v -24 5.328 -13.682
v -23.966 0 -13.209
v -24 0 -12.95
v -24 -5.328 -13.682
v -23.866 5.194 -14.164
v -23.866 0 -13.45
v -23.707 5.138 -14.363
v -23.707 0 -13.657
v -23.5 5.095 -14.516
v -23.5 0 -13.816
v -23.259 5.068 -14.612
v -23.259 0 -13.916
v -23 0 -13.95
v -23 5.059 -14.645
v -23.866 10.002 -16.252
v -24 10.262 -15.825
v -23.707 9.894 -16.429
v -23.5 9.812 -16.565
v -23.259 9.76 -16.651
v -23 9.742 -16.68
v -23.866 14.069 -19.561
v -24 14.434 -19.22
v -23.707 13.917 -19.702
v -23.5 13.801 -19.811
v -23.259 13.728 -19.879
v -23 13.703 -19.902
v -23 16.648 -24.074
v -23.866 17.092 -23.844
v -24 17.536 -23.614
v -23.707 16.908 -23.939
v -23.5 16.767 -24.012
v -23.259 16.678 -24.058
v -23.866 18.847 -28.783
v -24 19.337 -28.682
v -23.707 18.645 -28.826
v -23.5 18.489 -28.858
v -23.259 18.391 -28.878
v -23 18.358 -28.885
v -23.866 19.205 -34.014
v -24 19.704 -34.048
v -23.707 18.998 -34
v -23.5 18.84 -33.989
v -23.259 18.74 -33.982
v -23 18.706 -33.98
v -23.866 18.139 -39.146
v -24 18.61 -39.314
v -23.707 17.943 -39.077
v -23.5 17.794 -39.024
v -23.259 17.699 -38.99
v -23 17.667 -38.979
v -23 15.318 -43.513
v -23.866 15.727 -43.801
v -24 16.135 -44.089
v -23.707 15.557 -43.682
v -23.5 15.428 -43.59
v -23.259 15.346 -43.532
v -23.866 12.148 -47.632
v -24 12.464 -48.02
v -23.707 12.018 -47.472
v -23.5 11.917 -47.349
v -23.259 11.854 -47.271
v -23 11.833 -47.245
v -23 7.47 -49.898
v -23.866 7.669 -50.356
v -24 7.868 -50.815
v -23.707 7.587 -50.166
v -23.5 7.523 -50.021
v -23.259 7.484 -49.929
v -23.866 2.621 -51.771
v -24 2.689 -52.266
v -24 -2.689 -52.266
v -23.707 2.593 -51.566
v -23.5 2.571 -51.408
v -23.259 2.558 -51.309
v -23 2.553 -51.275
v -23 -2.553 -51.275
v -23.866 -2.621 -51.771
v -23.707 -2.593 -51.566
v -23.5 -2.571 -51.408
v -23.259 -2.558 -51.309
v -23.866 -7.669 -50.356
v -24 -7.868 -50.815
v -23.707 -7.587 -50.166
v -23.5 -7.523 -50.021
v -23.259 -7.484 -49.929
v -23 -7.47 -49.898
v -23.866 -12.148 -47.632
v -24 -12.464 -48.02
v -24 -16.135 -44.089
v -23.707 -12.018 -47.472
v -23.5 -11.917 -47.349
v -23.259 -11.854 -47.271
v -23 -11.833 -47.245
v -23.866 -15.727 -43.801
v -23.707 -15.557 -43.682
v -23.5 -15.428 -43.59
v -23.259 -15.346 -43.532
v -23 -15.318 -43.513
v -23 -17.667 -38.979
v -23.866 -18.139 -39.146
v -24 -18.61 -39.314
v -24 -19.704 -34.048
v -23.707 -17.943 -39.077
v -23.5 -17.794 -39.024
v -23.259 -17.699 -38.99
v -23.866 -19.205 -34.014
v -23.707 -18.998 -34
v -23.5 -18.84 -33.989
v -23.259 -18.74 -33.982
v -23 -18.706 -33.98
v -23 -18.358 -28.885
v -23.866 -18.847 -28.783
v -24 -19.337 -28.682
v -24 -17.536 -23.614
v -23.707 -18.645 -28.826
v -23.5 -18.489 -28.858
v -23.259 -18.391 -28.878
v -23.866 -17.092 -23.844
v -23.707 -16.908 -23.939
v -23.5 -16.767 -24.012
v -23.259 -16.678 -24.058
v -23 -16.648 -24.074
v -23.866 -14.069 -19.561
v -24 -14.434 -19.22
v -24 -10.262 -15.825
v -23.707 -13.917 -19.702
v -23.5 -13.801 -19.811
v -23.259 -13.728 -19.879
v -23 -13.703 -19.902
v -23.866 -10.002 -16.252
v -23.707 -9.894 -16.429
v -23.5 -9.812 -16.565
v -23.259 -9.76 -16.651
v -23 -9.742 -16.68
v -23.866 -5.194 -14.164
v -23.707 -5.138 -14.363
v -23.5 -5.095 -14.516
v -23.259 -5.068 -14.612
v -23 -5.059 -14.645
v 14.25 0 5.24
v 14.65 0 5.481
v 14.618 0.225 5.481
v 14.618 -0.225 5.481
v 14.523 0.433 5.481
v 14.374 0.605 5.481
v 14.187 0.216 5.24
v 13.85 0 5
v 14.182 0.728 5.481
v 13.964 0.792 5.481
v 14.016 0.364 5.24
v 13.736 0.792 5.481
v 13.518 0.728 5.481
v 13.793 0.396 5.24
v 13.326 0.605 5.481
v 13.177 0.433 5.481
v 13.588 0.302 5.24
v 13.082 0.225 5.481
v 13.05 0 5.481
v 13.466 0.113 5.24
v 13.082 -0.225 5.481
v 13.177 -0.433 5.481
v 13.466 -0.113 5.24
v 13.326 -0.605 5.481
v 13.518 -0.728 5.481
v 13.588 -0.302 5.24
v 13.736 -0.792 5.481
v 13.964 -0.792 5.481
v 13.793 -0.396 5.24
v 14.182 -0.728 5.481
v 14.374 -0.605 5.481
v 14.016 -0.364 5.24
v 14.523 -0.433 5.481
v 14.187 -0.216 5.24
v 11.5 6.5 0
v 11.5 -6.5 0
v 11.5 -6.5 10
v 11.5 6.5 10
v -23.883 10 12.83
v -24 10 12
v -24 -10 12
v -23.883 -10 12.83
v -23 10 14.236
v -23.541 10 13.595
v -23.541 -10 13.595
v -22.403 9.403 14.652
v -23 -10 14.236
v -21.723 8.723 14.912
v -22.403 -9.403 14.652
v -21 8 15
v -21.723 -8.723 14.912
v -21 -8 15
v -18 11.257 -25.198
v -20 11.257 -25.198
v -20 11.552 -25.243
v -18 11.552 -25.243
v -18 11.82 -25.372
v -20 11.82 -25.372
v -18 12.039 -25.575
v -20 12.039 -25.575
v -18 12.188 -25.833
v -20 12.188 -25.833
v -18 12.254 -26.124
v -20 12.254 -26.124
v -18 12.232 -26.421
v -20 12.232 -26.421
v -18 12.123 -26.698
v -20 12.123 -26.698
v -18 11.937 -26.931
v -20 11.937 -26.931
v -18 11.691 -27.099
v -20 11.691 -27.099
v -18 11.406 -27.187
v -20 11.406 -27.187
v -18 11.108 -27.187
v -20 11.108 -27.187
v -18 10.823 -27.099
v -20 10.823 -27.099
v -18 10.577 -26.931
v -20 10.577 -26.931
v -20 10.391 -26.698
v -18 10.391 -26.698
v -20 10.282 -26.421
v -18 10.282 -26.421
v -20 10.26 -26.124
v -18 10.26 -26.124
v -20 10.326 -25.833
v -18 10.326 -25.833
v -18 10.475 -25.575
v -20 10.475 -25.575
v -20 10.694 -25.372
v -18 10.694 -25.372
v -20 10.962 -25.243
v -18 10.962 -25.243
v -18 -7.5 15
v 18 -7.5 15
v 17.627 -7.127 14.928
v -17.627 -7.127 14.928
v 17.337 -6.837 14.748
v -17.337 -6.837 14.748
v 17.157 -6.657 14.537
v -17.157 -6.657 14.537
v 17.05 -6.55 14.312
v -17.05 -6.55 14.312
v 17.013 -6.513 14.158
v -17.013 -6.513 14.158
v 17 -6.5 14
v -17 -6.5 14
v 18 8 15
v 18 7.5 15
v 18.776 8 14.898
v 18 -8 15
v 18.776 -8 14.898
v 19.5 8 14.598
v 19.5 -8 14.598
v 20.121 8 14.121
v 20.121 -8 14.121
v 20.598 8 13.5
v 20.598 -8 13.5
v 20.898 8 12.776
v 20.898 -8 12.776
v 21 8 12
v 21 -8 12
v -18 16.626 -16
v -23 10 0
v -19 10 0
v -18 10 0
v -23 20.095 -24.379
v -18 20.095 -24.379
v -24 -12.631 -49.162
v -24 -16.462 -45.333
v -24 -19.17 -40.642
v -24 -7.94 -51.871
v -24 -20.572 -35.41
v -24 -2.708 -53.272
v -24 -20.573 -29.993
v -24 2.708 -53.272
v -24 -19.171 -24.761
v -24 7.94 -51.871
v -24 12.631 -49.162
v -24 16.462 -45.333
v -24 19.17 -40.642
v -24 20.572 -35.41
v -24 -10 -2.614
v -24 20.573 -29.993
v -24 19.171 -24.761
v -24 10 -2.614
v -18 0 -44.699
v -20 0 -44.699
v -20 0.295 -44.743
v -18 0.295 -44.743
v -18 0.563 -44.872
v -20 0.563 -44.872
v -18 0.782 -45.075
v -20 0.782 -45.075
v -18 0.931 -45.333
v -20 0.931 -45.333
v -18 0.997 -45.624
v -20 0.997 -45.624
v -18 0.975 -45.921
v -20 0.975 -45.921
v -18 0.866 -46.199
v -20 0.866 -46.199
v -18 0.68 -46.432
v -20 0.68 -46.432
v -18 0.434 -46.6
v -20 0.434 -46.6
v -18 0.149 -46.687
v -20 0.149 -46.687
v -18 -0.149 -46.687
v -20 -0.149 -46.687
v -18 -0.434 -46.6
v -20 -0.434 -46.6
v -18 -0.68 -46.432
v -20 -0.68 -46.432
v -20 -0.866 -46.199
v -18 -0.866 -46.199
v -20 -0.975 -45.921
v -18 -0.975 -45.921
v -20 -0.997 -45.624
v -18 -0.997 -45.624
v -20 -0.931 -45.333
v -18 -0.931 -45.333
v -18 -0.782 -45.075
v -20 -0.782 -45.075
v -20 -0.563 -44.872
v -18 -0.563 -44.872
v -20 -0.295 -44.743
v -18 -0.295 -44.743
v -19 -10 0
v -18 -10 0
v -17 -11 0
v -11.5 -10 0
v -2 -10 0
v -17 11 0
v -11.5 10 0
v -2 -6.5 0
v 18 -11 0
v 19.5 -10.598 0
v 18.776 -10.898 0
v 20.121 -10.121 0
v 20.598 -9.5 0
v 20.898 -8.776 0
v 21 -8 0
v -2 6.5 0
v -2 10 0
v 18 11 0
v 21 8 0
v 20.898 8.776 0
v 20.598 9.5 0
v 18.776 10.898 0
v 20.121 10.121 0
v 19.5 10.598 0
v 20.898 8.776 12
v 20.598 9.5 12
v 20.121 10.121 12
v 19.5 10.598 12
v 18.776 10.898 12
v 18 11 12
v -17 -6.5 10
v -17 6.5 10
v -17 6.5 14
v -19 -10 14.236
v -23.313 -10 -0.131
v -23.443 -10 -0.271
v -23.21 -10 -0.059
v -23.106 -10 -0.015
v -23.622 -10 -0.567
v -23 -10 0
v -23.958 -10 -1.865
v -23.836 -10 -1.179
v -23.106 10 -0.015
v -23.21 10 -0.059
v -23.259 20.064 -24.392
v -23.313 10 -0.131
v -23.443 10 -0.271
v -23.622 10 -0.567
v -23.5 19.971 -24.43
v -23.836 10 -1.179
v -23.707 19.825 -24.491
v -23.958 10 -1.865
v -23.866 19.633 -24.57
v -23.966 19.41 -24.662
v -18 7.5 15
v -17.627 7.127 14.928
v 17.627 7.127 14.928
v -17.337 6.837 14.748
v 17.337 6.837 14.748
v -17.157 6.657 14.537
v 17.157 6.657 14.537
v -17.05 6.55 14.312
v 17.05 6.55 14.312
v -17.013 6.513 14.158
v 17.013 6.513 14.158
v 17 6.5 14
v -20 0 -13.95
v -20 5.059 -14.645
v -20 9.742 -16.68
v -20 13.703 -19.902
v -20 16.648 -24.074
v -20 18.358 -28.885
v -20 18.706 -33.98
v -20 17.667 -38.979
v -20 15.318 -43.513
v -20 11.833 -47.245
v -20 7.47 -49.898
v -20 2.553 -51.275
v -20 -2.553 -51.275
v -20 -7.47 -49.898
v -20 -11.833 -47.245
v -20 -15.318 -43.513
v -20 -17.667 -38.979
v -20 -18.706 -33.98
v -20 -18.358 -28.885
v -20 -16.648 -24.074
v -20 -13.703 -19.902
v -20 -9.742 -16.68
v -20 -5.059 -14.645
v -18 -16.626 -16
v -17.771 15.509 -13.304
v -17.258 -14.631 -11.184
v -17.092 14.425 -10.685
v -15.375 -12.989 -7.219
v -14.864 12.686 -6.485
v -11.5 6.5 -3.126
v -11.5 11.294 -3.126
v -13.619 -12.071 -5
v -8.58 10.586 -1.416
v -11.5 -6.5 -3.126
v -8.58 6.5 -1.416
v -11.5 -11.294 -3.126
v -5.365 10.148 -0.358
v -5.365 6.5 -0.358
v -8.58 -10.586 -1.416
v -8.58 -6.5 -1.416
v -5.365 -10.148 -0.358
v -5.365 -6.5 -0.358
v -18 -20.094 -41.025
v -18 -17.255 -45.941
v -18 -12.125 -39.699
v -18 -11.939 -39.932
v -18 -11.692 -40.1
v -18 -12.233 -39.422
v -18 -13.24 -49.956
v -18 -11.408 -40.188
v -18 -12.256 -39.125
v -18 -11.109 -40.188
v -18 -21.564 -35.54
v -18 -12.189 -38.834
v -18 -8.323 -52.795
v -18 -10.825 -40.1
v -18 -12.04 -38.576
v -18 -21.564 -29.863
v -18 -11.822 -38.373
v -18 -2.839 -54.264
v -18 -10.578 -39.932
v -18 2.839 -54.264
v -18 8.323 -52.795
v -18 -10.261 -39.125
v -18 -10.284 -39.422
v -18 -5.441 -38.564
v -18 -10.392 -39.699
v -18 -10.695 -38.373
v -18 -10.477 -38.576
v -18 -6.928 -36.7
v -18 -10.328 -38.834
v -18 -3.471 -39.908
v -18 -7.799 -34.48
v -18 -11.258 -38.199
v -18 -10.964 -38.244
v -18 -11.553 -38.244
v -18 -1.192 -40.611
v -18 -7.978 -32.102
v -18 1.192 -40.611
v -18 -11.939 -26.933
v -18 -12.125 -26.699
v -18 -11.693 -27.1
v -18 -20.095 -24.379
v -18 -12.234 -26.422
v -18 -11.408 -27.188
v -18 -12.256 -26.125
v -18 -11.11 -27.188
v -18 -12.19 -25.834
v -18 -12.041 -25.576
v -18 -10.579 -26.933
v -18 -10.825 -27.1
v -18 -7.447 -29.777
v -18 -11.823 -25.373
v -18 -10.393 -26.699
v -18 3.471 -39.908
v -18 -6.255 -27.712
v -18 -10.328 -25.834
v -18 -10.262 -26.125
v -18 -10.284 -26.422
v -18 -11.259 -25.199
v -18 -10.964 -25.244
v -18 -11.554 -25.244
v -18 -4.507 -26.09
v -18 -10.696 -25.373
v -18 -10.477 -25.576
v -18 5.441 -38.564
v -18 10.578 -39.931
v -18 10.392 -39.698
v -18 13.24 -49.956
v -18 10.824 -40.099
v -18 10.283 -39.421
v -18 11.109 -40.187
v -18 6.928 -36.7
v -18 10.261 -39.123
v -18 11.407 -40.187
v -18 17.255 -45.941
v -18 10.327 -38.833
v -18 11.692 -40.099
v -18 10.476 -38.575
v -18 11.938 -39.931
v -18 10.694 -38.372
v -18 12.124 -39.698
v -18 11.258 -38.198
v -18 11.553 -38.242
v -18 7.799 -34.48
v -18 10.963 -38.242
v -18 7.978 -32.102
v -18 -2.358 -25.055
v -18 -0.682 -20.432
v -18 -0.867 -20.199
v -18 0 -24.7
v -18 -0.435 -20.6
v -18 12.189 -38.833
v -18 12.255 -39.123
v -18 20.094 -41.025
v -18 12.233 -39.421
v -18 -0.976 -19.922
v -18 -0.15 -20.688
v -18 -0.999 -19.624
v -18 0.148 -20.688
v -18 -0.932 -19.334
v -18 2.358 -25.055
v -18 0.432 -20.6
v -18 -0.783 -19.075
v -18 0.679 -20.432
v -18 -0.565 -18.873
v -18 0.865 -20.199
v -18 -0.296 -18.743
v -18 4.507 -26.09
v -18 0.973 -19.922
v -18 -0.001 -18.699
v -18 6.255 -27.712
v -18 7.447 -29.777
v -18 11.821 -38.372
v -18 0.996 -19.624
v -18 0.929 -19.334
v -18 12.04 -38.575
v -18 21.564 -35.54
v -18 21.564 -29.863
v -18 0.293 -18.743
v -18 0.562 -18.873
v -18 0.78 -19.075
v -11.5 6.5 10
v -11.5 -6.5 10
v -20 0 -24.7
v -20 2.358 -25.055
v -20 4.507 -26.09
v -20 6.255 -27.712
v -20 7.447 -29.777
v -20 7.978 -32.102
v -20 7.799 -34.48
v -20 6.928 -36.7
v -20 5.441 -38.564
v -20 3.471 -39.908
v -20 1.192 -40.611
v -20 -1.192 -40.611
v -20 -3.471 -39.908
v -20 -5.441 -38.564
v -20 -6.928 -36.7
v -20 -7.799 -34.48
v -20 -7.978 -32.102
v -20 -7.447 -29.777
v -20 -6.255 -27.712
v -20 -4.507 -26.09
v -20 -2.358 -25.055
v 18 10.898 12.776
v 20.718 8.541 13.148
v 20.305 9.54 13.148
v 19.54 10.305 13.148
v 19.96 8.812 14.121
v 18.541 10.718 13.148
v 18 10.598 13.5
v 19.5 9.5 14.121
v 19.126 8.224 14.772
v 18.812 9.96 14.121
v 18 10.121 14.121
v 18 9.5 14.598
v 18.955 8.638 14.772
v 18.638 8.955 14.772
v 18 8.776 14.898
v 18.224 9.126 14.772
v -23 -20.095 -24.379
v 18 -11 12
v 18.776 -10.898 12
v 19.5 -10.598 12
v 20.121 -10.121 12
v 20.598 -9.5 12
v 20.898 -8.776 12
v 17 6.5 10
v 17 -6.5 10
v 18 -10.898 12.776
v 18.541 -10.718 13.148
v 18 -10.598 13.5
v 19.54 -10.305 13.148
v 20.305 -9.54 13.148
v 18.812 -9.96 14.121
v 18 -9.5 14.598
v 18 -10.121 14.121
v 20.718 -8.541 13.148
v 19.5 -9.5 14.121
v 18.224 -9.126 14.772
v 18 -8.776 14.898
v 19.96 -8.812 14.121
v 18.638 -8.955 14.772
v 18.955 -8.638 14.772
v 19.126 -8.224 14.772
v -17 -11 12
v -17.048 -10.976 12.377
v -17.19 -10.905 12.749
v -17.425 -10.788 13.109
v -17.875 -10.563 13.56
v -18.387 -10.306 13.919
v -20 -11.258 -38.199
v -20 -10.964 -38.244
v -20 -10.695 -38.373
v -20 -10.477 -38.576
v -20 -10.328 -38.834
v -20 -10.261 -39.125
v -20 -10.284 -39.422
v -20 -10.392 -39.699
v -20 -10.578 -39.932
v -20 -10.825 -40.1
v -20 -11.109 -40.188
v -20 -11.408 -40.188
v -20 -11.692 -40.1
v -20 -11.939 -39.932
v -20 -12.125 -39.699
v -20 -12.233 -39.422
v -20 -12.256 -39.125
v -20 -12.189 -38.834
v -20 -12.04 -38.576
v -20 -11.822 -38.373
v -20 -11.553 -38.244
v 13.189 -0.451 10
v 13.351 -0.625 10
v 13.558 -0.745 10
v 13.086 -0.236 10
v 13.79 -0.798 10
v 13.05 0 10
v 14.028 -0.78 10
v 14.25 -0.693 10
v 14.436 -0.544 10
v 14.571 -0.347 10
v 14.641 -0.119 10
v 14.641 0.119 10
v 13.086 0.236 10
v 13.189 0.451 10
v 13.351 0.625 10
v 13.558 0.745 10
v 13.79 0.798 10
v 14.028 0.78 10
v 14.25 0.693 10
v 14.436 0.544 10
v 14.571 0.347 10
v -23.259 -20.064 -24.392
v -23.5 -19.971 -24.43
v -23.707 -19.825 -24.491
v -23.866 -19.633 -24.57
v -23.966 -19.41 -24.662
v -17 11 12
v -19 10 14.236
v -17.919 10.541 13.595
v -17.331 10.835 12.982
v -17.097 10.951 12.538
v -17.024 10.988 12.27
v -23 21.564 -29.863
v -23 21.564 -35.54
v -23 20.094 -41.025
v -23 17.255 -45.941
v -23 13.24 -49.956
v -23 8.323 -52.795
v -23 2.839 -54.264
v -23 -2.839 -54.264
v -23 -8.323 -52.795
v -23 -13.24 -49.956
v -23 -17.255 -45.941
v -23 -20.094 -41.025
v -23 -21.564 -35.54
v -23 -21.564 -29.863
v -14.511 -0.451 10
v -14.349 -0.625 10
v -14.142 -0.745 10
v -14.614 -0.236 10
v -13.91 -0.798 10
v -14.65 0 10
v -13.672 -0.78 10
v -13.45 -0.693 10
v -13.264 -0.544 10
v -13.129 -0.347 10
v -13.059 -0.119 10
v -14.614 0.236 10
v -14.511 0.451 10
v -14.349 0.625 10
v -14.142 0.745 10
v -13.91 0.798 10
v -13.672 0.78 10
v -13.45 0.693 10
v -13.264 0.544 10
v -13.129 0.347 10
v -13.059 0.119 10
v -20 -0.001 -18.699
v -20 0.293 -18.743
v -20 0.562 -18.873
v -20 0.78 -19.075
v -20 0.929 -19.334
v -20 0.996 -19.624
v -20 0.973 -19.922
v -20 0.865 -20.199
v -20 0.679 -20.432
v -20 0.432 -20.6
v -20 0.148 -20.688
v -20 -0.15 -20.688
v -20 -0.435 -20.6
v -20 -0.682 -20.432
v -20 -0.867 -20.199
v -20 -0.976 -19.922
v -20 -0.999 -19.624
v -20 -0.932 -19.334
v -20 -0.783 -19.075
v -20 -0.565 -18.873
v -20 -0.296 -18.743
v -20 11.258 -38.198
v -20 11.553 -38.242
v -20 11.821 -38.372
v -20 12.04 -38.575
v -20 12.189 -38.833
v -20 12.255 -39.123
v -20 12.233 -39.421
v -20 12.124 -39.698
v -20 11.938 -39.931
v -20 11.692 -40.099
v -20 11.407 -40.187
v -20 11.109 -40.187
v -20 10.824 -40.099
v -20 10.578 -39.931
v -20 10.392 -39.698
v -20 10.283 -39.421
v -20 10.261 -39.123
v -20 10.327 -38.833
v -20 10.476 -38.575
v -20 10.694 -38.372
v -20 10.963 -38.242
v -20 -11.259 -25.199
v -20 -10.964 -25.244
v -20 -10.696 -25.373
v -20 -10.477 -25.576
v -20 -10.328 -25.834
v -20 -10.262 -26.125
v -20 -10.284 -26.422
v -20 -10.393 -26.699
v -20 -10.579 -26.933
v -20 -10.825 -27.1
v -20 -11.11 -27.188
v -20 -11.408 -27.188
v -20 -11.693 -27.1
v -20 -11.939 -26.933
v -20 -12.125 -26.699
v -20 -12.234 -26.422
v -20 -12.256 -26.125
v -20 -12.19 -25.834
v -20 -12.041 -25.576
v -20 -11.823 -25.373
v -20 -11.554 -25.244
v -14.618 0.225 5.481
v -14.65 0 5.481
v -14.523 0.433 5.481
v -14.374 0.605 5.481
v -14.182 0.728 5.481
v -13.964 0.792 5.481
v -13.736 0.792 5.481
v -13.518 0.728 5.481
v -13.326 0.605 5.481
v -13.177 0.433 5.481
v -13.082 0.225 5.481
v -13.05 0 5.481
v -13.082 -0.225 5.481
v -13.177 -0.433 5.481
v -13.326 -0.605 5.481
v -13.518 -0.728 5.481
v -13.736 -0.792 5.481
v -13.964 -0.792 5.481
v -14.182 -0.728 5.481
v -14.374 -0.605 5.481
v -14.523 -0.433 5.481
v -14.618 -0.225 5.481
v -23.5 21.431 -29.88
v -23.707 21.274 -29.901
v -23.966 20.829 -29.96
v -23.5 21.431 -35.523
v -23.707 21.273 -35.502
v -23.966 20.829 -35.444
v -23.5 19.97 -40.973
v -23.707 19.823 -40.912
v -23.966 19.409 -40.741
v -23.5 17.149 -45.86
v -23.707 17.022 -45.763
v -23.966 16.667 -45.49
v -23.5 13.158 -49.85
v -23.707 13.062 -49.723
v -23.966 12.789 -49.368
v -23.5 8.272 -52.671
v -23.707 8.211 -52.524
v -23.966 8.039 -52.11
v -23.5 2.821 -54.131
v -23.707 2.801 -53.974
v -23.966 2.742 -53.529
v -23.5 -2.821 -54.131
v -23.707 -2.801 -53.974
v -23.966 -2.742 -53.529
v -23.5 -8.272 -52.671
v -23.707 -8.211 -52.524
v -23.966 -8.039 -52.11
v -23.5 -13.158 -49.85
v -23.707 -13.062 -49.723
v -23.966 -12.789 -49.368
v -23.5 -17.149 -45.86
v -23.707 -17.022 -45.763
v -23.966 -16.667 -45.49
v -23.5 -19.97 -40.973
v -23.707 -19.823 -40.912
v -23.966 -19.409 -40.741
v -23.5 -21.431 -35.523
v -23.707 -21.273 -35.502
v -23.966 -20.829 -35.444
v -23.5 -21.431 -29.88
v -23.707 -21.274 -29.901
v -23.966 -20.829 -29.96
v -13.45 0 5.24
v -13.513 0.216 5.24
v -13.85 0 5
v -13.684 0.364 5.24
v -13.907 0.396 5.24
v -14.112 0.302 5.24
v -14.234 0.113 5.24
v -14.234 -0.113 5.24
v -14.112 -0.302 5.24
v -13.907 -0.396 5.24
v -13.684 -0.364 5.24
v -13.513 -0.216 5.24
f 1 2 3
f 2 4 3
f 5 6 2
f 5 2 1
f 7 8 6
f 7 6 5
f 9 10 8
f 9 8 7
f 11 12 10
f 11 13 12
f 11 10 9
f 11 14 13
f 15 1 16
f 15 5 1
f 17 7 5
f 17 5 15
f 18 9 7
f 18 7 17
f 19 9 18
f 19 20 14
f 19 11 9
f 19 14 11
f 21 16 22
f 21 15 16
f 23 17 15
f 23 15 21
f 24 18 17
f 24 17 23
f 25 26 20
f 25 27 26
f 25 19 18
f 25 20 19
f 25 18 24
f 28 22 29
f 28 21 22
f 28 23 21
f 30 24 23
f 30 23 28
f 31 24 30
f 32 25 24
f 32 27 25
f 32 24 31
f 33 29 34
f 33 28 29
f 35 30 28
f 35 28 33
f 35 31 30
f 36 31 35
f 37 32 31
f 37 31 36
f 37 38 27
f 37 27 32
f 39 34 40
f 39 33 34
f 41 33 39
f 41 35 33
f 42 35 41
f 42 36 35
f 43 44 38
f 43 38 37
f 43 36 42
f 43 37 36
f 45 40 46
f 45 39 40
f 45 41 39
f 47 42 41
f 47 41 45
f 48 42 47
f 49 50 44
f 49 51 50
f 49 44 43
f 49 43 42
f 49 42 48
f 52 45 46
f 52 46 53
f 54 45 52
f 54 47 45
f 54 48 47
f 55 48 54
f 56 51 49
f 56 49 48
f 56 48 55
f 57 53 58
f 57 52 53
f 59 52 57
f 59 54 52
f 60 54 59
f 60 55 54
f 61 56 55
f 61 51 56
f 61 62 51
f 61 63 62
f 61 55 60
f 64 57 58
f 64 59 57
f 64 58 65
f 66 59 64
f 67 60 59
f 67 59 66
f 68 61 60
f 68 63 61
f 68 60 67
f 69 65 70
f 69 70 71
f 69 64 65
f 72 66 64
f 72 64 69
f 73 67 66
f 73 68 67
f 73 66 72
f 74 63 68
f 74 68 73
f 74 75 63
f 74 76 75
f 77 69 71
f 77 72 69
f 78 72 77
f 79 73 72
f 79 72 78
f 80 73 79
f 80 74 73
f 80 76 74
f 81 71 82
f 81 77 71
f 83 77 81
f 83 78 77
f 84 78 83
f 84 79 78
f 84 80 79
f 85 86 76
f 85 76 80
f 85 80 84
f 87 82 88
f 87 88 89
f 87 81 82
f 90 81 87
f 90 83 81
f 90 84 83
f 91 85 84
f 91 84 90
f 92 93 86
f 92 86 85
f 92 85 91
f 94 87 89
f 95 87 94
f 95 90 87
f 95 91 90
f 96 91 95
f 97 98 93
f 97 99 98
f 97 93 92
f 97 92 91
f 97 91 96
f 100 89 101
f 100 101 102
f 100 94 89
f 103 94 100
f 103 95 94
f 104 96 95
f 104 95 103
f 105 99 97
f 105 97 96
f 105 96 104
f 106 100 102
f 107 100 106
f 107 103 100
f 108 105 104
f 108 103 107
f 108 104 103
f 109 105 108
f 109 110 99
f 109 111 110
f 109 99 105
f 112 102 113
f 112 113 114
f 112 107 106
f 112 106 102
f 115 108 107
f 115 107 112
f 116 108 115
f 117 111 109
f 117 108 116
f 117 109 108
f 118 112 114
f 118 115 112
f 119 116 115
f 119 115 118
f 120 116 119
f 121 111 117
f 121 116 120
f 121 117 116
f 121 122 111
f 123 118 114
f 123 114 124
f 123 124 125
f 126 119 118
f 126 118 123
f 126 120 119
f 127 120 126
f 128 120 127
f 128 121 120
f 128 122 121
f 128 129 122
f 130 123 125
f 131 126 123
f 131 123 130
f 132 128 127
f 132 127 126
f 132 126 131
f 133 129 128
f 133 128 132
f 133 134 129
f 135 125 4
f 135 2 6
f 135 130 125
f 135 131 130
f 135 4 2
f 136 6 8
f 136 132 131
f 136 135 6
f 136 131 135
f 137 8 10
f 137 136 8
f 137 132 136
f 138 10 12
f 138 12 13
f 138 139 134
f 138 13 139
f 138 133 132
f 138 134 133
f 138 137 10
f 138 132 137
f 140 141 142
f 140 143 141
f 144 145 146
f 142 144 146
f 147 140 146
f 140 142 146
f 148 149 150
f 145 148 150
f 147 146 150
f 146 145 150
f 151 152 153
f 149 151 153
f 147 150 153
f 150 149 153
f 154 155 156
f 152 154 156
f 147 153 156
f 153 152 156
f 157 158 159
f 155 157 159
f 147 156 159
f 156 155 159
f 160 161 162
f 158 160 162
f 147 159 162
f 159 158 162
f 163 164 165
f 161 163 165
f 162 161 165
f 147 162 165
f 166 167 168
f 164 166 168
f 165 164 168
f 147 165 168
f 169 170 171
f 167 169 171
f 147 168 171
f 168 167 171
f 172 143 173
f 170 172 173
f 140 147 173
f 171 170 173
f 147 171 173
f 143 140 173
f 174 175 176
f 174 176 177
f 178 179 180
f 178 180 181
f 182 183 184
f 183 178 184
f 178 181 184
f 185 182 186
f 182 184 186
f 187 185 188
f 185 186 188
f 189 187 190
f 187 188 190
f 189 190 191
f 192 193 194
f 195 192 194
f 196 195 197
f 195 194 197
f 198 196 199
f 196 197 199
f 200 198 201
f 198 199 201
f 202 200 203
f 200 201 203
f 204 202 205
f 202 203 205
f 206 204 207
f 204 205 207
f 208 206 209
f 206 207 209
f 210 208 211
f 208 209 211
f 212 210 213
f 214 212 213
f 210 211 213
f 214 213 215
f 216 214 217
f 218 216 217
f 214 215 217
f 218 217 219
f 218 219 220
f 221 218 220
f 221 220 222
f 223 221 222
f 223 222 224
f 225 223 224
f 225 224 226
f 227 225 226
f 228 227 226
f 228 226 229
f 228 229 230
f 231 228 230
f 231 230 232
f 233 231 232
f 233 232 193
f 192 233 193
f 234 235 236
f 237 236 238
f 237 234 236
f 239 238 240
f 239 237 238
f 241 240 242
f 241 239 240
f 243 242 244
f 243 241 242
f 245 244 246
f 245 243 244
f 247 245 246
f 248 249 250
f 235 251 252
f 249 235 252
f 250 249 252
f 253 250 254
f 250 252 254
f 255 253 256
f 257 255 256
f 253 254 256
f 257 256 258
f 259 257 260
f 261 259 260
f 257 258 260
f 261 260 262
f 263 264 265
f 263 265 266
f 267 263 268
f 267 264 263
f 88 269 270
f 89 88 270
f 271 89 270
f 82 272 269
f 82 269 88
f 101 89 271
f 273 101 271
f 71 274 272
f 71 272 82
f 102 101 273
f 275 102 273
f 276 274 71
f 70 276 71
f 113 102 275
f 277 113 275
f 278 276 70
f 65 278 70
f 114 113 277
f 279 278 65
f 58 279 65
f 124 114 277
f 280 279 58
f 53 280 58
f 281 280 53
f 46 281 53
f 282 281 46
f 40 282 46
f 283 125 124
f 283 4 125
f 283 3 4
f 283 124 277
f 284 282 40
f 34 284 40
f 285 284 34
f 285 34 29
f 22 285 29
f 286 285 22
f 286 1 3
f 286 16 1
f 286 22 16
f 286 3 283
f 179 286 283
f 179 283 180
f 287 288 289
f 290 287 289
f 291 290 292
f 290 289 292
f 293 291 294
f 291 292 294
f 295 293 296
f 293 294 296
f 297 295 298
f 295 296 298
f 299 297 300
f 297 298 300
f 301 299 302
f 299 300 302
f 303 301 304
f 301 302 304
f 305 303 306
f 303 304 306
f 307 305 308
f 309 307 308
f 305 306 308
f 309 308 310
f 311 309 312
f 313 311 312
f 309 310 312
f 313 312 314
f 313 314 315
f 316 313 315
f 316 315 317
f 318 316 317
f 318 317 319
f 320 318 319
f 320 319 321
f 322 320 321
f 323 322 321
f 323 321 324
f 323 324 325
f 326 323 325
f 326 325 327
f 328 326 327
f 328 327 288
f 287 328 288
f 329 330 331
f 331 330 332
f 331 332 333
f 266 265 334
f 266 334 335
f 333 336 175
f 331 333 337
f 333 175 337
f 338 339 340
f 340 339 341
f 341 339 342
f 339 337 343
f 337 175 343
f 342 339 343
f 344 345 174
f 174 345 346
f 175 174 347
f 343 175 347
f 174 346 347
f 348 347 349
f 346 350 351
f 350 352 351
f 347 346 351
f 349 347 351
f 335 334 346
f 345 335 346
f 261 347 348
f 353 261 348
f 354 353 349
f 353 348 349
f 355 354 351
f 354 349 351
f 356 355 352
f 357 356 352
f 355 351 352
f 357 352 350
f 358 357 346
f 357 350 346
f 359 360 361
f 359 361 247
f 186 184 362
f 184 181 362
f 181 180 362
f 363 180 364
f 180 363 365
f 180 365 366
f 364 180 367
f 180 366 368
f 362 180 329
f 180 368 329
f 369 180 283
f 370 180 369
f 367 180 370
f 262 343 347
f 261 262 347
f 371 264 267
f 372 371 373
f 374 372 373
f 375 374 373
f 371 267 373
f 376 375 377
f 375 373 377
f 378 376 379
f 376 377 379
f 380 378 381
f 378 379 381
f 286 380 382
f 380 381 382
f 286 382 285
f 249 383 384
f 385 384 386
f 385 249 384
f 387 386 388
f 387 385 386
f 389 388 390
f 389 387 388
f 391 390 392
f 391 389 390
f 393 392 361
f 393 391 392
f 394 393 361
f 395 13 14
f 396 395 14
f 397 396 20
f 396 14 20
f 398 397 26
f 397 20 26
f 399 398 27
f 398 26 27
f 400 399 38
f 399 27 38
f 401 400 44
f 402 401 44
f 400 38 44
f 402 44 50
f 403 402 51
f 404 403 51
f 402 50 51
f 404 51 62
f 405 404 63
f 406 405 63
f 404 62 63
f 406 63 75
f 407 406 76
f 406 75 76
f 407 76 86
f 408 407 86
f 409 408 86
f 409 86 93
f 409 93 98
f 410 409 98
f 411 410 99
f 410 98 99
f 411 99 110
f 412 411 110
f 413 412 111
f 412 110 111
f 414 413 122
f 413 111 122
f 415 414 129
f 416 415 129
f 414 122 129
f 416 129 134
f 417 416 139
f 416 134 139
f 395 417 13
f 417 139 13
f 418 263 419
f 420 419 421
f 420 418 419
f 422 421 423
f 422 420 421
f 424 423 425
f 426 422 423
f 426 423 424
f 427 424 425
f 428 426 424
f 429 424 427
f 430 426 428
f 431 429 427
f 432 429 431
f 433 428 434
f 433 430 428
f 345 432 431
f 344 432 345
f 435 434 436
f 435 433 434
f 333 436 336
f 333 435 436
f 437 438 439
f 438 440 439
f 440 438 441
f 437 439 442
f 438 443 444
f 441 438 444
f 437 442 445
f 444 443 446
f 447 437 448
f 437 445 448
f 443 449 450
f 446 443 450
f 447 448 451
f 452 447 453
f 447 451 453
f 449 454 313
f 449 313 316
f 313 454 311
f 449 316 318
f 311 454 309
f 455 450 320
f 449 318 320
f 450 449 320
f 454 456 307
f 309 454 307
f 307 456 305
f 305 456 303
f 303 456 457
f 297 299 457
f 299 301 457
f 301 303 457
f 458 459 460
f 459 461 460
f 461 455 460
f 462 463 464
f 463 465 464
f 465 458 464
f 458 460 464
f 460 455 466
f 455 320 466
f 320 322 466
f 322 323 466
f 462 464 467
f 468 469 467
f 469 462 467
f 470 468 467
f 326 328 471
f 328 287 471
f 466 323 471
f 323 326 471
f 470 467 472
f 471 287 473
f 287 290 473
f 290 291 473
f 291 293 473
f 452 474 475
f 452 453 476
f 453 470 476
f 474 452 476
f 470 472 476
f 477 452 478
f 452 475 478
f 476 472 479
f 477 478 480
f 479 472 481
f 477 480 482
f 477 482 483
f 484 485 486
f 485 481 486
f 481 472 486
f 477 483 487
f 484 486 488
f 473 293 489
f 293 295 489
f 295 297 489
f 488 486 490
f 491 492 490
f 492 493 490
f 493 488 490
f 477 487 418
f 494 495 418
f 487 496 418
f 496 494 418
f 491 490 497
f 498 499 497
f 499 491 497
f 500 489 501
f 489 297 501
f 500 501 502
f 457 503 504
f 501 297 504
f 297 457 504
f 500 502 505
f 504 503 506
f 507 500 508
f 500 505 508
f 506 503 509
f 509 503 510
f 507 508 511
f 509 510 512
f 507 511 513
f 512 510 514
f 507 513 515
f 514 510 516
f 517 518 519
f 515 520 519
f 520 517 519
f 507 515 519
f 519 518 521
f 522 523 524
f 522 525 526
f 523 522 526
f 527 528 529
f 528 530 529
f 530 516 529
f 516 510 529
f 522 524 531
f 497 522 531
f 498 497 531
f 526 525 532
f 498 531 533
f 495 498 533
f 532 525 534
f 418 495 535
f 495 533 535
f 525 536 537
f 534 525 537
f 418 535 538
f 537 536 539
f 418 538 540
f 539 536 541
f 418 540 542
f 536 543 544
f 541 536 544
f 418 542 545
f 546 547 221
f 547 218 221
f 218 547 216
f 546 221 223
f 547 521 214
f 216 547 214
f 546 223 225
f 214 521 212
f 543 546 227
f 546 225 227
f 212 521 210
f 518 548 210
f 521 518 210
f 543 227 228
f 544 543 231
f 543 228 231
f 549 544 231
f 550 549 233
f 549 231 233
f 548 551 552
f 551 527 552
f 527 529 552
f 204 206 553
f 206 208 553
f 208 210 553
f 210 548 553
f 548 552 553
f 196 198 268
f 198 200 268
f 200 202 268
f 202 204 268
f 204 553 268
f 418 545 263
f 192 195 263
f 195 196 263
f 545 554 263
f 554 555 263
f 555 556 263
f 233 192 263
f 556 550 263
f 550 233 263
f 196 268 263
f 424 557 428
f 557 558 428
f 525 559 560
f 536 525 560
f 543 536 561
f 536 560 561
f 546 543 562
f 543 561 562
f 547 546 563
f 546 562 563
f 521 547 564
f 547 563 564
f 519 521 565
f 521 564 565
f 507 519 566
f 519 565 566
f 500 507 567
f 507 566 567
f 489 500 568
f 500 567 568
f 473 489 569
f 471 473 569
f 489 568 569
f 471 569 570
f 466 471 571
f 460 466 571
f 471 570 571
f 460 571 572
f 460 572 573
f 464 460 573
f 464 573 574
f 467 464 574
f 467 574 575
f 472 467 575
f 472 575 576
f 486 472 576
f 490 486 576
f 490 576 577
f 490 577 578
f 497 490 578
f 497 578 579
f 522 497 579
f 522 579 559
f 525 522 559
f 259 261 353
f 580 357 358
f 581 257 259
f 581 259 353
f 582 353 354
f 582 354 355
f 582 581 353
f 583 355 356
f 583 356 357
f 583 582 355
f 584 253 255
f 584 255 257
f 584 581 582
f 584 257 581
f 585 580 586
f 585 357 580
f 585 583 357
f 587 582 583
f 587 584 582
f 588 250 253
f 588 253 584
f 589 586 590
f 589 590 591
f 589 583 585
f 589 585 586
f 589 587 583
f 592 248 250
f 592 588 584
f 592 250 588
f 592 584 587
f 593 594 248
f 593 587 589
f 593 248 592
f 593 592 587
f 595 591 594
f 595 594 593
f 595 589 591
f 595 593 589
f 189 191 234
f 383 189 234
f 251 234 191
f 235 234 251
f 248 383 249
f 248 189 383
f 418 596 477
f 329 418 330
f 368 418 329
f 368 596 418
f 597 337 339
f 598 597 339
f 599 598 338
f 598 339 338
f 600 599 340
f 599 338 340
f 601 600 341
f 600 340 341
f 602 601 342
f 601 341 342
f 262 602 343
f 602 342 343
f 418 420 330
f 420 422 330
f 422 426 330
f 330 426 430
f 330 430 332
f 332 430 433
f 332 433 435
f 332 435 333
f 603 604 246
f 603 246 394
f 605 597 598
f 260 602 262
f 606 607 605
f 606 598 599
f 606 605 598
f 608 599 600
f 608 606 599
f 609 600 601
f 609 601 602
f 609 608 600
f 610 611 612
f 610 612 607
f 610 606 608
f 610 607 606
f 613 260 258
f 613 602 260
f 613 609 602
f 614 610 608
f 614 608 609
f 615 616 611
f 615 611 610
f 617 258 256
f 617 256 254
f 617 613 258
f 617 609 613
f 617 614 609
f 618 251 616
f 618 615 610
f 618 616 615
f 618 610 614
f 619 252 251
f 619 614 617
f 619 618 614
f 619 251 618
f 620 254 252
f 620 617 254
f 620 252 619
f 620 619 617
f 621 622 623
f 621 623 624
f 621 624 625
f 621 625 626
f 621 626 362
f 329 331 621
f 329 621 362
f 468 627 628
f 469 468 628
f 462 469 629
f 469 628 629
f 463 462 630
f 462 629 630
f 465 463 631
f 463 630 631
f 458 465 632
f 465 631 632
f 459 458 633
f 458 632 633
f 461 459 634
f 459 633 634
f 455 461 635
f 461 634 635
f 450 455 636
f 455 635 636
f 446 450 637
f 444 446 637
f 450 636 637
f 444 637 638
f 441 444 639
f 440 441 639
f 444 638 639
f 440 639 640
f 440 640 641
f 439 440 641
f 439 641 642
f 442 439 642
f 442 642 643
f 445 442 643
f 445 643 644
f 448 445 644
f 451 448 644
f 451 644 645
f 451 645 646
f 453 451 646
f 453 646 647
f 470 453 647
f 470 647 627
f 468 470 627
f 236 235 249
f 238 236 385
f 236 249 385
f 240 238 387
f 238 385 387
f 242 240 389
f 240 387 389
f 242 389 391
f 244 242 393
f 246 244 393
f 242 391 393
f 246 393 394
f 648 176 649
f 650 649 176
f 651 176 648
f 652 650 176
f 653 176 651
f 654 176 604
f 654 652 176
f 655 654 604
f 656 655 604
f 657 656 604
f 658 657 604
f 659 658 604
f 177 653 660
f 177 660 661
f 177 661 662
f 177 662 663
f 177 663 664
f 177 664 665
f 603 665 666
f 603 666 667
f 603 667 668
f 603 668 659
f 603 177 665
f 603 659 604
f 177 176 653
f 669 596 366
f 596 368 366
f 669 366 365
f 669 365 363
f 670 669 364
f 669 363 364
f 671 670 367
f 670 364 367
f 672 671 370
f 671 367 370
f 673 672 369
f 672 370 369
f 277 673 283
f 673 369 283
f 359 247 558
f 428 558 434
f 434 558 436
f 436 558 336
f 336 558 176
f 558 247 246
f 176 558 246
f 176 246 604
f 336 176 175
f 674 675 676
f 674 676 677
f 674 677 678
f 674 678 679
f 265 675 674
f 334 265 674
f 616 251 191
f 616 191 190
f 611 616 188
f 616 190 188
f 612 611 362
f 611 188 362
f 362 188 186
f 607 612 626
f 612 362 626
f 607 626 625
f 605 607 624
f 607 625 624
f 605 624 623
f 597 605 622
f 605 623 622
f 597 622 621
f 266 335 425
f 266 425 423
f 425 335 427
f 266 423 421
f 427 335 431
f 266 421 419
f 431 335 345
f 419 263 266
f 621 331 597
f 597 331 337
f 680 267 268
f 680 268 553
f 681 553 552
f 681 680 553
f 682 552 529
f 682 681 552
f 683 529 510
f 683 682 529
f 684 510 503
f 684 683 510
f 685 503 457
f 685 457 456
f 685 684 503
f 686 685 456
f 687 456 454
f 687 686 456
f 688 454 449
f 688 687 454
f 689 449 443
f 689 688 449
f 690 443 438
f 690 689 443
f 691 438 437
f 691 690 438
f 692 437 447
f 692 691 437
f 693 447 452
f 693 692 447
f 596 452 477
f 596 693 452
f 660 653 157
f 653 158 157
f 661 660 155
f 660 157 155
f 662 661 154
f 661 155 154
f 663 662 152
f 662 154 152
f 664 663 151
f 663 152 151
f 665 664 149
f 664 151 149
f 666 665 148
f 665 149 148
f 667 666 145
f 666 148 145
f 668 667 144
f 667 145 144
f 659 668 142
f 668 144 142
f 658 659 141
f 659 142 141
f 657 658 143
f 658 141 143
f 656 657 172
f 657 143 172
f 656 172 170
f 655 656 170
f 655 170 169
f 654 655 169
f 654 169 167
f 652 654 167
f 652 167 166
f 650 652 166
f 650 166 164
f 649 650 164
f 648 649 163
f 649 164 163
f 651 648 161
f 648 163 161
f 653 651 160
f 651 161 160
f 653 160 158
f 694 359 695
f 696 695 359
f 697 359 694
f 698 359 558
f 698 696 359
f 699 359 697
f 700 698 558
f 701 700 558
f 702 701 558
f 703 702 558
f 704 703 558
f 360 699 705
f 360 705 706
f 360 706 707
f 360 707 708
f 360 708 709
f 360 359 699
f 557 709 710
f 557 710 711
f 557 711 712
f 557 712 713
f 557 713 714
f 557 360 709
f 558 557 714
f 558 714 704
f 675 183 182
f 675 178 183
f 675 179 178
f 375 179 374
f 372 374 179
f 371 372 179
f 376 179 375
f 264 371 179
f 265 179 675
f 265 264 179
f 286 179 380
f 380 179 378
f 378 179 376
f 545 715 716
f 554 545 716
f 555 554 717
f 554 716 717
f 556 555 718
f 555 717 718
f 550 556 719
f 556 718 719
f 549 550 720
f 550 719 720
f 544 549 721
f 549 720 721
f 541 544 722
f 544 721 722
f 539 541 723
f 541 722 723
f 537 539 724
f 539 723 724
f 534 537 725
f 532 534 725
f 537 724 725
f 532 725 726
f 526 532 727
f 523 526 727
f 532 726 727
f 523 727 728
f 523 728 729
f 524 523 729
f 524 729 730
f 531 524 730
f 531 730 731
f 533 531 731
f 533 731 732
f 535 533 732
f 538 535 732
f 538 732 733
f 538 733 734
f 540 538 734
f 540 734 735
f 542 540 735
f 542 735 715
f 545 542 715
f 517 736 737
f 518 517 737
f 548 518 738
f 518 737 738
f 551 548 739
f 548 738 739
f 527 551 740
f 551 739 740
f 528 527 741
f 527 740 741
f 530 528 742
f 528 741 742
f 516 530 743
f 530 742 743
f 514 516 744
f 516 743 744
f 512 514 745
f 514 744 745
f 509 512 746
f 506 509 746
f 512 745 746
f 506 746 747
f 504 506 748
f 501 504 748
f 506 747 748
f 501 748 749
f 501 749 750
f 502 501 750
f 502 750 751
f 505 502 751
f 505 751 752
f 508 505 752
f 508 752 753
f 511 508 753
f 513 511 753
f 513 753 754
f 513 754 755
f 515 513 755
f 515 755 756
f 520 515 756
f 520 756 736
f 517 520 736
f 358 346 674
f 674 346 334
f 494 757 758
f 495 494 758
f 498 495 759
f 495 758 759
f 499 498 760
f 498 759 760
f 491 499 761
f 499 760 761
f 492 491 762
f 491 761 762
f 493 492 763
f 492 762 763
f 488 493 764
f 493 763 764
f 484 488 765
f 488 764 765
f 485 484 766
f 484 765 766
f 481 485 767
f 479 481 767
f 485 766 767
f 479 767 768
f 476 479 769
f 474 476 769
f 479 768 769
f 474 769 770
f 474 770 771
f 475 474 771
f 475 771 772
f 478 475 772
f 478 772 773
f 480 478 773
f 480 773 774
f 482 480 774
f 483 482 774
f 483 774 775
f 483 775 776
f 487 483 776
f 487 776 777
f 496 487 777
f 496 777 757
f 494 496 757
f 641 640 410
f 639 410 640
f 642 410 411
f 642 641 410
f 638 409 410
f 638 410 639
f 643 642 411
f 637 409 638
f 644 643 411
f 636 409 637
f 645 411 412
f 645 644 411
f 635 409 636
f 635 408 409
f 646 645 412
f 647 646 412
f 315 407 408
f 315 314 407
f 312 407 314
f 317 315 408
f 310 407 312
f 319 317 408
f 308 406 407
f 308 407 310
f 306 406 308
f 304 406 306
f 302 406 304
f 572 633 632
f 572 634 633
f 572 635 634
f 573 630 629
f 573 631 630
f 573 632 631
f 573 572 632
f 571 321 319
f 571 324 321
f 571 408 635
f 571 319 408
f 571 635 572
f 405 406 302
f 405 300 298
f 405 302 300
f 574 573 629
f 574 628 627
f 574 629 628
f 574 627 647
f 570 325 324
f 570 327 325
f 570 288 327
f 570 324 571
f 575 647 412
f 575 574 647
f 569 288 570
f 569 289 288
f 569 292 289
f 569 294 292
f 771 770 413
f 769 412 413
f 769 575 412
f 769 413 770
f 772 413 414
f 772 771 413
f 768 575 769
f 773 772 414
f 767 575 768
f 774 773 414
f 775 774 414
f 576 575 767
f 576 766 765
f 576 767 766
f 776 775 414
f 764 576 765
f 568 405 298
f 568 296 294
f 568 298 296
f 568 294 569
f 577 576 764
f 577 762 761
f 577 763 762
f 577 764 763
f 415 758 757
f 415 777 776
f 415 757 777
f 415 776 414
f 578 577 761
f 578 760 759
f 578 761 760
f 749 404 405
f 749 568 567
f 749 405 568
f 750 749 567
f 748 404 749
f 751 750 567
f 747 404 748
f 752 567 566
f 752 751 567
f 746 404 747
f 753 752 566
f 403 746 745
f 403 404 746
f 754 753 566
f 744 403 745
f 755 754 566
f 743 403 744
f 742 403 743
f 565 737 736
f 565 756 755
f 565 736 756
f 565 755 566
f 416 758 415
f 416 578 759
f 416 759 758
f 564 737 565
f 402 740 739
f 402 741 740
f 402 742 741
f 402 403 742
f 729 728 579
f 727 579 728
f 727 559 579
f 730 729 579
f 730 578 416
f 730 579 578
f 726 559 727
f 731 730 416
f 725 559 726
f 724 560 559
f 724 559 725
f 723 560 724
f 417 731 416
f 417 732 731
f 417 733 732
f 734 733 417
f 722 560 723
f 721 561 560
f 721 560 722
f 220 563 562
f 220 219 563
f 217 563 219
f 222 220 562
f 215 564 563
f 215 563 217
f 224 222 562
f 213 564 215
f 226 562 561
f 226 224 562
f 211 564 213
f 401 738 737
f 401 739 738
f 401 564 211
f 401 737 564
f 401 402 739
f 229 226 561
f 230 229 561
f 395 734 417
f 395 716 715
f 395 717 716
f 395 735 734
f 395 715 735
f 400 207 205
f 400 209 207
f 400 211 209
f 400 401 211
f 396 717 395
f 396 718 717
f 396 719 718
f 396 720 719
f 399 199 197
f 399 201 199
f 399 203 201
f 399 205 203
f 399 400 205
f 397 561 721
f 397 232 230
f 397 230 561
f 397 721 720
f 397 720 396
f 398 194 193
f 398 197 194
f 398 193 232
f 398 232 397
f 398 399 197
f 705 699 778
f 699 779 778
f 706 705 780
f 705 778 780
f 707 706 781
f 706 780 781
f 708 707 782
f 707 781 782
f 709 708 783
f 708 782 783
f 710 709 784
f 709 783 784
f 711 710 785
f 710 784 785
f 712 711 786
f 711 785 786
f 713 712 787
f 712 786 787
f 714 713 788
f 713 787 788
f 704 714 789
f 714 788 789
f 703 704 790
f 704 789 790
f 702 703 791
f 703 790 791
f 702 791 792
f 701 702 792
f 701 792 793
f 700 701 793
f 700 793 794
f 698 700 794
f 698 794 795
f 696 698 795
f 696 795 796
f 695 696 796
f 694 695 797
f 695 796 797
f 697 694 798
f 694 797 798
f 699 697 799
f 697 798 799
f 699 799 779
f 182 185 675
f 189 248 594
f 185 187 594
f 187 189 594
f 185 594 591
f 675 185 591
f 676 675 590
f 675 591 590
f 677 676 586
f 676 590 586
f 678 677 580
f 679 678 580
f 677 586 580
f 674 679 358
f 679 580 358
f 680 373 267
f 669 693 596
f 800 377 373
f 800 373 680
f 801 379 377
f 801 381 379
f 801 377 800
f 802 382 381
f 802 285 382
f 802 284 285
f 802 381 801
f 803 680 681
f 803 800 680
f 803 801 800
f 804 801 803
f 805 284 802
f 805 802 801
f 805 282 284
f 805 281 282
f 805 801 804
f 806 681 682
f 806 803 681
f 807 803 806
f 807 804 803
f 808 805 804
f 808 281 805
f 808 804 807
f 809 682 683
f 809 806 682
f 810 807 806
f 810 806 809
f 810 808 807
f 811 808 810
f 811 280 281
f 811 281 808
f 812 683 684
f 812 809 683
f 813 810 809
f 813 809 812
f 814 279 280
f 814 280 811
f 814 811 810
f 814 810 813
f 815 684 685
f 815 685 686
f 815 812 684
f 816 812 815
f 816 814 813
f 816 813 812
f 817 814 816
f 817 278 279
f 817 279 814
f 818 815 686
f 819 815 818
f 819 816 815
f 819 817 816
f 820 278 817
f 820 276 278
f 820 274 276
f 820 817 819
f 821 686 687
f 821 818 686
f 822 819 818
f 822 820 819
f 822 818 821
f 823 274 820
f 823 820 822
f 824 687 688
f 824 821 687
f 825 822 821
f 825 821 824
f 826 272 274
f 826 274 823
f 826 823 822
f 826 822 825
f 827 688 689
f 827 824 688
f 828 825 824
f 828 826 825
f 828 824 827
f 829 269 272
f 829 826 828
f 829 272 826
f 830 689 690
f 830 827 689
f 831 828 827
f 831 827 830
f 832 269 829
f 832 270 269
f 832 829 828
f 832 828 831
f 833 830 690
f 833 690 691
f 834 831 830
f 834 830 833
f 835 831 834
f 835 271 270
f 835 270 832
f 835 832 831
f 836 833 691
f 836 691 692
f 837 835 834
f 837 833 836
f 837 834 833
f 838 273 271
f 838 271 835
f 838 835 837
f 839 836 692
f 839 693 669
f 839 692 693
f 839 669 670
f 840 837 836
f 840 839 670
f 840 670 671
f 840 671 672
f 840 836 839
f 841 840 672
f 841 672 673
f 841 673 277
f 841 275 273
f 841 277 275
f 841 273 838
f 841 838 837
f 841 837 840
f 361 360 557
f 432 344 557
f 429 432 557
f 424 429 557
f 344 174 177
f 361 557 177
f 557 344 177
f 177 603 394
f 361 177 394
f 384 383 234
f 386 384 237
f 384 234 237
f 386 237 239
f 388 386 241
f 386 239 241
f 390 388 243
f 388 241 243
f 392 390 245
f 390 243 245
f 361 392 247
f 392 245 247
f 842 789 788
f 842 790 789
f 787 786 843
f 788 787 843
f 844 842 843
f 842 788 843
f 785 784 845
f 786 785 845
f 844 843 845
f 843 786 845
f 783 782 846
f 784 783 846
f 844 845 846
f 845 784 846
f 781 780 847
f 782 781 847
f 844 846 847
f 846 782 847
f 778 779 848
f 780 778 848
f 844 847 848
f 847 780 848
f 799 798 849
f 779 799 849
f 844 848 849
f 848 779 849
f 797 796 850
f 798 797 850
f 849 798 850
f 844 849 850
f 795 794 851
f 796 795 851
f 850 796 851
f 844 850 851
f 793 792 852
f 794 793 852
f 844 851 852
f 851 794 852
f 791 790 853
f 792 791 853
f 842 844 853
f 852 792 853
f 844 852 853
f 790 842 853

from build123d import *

# Parameters (mm, degrees)
SKETCH_1_W              = 23
SKETCH_1_H              = 13
EXTRUDE_1_DEPTH         = 10
EXTRUDE_START           = 10
SKETCH_1_5_W            = 4
SKETCH_1_5_H            = 22
SKETCH_1_5_W_2          = 5
SKETCH_1_5_H_2          = 20
EXTRUDE_2_DEPTH         = 5
SKETCH_9_R              = 21.75
SKETCH_9_R_2            = 18.75
SKETCH_9_R_3            = 8
EXTRUDE_4_DEPTH         = 6
SKETCH_9_5_R            = 18.75
CUT_EXTRUDE_4_DEPTH     = 4
FILLET_6_R              = 1
SKETCH_10_R             = 1
CUT_EXTRUDE_5_DEPTH     = 4
FILLET_3_R              = 1
HOLE_WIZARD_M1_41_D     = 1.6
HOLE_WIZARD_M1_41_DEPTH = 4.519311505
HOLE_WIZARD_M1_41_TIP   = 0.480688495
FILLET_7_R              = 3
FILLET_8_R              = 16


with BuildPart() as part:
    # Эскиз1 → Бобышка-Вытянуть1 (new body)
    with BuildSketch(Plane.XY):
        Polygon((-17, -11), (21, -11), (21, 11), (-17, 11), (-19, 10), (-24, 10), (-24, -10), (-19, -10), align=None)
        Rectangle(SKETCH_1_W, SKETCH_1_H, mode=Mode.SUBTRACT)
    extrude(amount=EXTRUDE_1_DEPTH)

    # Эскиз1<5> → Бобышка-Вытянуть2 (add)
    with BuildSketch(Plane.XY.offset(EXTRUDE_START)):
        Polygon((-11.5, 6.5), (11.5, 6.5), (17, 6.5), (17, 11), (-17, 11), (-17, 6.5), align=None)
        with Locations((19, 0)):
            Rectangle(SKETCH_1_5_W, SKETCH_1_5_H)
        Polygon((17, -6.5), (11.5, -6.5), (-11.5, -6.5), (-17, -6.5), (-17, -11), (17, -11), align=None)
        Polygon((-19, -10), (-19, 10), (-17, 11), (-17, -11), align=None)
        with Locations((-21.5, 0)):
            Rectangle(SKETCH_1_5_W_2, SKETCH_1_5_H_2)
    extrude(amount=EXTRUDE_2_DEPTH)

    # Эскиз9 → Бобышка-Вытянуть4 (add)
    # profile 1 of 3: a face of its own
    with BuildSketch(Plane.ZY.offset(24)):
        with Locations((-32.7, 0)):
            Circle(SKETCH_9_R)
        with Locations((-32.7, 0)):
            Circle(SKETCH_9_R_2, mode=Mode.SUBTRACT)
    # profile 2 of 3: a face of its own
    with BuildSketch(Plane.ZY.offset(24)):
        with BuildLine():
            ThreePointArc((-10.95, 0), (-14.616118395, -12.08452424), (-24.378572515, -20.095182124))
            Line((-24.378572515, -20.095182124), (0, -10))
            Line((0, -10), (0, 10))
            Line((0, 10), (-24.378572515, 20.095182124))
            ThreePointArc((-24.378572515, 20.095182124), (-14.616118395, 12.08452424), (-10.95, 0))
        make_face()
    # profile 3 of 3: a face of its own
    with BuildSketch(Plane.ZY.offset(24)):
        with Locations((-32.7, 0)):
            Circle(SKETCH_9_R_2)
        with Locations((-32.7, 0)):
            Circle(SKETCH_9_R_3, mode=Mode.SUBTRACT)
    extrude(amount=-EXTRUDE_4_DEPTH)

    # Эскиз9<5> → Вырез-Вытянуть4 (cut)
    with BuildSketch(Plane.ZY.offset(24)):
        with Locations((-32.7, 0)):
            Circle(SKETCH_9_5_R)
    extrude(amount=-CUT_EXTRUDE_4_DEPTH, mode=Mode.SUBTRACT)

    # Скругление6
    fillet_6_edges = [part.edges().sort_by_distance(p)[0] for p in [
        (-24, 0, -51.45),
        (-24, 0, -54.45),
        (-24, -15.047591062, -12.189286258),
        (-24, 15.047591062, -12.189286258),
    ]]
    fillet(fillet_6_edges, radius=FILLET_6_R)

    # Эскиз10 → Вырез-Вытянуть5 (cut)
    with BuildSketch(Plane.ZY.offset(20)):
        with Locations((-45.698540936, 0)):
            Circle(SKETCH_10_R)
        with Locations((-39.198031114, 11.257782204)):
            Circle(SKETCH_10_R)
        with Locations((-26.198250825, 11.257066663)):
            Circle(SKETCH_10_R)
        with Locations((-19.698980357, -0.001431082)):
            Circle(SKETCH_10_R)
        with Locations((-26.199490179, -11.259213286)):
            Circle(SKETCH_10_R)
        with Locations((-39.199270468, -11.258497745)):
            Circle(SKETCH_10_R)
    extrude(amount=-CUT_EXTRUDE_5_DEPTH, mode=Mode.SUBTRACT)

    # Скругление3
    fillet_3_edges = [part.edges().sort_by_distance(p)[0] for p in [
        (0, 6.5, 15),
        (17, 0, 15),
        (-17, 0, 15),
        (0, -6.5, 15),
    ]]
    fillet(fillet_3_edges, radius=FILLET_3_R)

    # Отверстие с зазором M1.41
    with Locations(Plane.XY.offset(10)):
        with Locations((13.85, 0), (-13.85, 0)):
            Hole(HOLE_WIZARD_M1_41_D / 2, depth=HOLE_WIZARD_M1_41_DEPTH)
            with Locations((0, 0, -(HOLE_WIZARD_M1_41_DEPTH + HOLE_WIZARD_M1_41_TIP / 2))):  # 118° drill point
                Cone(0, HOLE_WIZARD_M1_41_D / 2, HOLE_WIZARD_M1_41_TIP, mode=Mode.SUBTRACT)

    # Скругление7
    # the kernel refuses this fillet: 3 mm, written as the material it takes off along each edge
    with BuildSketch(Plane(origin=(18, -8, 12), x_dir=(0, -1, 0), z_dir=(0, 0, 1))) as fillet_7_piece_1_section:
        Polygon((0, 0), (FILLET_7_R, 0), (FILLET_7_R, FILLET_7_R), (0, FILLET_7_R), align=None)
    fillet_7_piece_1 = extrude(amount=FILLET_7_R, mode=Mode.PRIVATE)
    fillet_7_piece_1 = fillet_7_piece_1 - Plane(origin=(18, -8, 12), x_dir=(-0.7071067811865475, 0.7071067811865475, 0), z_dir=(0, 0, 1)) * Sphere(FILLET_7_R, mode=Mode.PRIVATE)
    add(fillet_7_piece_1, mode=Mode.SUBTRACT)
    with BuildSketch(Plane(origin=(18, 8, 12), x_dir=(1, 0, 0), z_dir=(0, 0, 1))) as fillet_7_piece_2_section:
        Polygon((0, 0), (FILLET_7_R, 0), (FILLET_7_R, FILLET_7_R), (0, FILLET_7_R), align=None)
    fillet_7_piece_2 = extrude(amount=FILLET_7_R, mode=Mode.PRIVATE)
    fillet_7_piece_2 = fillet_7_piece_2 - Plane(origin=(18, 8, 12), x_dir=(-0.7071067811865475, -0.7071067811865476, 0), z_dir=(0, 0, 1)) * Sphere(FILLET_7_R, mode=Mode.PRIVATE)
    add(fillet_7_piece_2, mode=Mode.SUBTRACT)
    with BuildSketch(Plane(origin=(21, -8, 15), x_dir=(-1, 0, 0), z_dir=(0, 1, 0))) as fillet_7_piece_3:
        with BuildLine():
            CenterArc((FILLET_7_R, -FILLET_7_R), FILLET_7_R, 90, 90)
            Line((0, -FILLET_7_R), (0, 0))
            Line((0, 0), (FILLET_7_R, 0))
        make_face()
    extrude(amount=16, mode=Mode.SUBTRACT)
    with BuildSketch(Plane(origin=(-24.5, -11, 15), x_dir=(0, 1, 0), z_dir=(1, 0, 0)), Plane(origin=(18, 11, 15), x_dir=(0, -1, 0), z_dir=(-1, 0, 0))) as fillet_7_piece_4:
        with BuildLine():
            CenterArc((FILLET_7_R, -FILLET_7_R), FILLET_7_R, 90, 90)
            Line((0, -FILLET_7_R), (0, 0))
            Line((0, 0), (FILLET_7_R, 0))
        make_face()
    extrude(amount=42.5, mode=Mode.SUBTRACT)
    with BuildSketch(Plane(origin=(21, 11, -7.5), x_dir=(0, -1, 0), z_dir=(0, 0, 1)), Plane(origin=(21, -11, -7.5), x_dir=(-1, 0, 0), z_dir=(0, 0, 1))) as fillet_7_piece_5:
        with BuildLine():
            CenterArc((FILLET_7_R, -FILLET_7_R), FILLET_7_R, 90, 90)
            Line((0, -FILLET_7_R), (0, 0))
            Line((0, 0), (FILLET_7_R, 0))
        make_face()
    extrude(amount=19.5, mode=Mode.SUBTRACT)
    with BuildSketch(Plane(origin=(-24, -17.5, 15), x_dir=(1, 0, 0), z_dir=(0, 1, 0))) as fillet_7_piece_6:
        with BuildLine():
            CenterArc((FILLET_7_R, FILLET_7_R), FILLET_7_R, 180, 90)
            Line((0, FILLET_7_R), (0, 0))
            Line((0, 0), (FILLET_7_R, 0))
        make_face()
    extrude(amount=35, mode=Mode.SUBTRACT)

    # Скругление8
    # the kernel refuses this fillet: 16 mm, written as the material it adds along each edge
    with BuildSketch(Plane(origin=(-18, -50, 0), x_dir=(1, 0, 0), z_dir=(0, 1, 0))) as fillet_8_piece_1_section:
        with BuildLine():
            CenterArc((FILLET_8_R, FILLET_8_R), FILLET_8_R, 180, 90)
            Line((0, FILLET_8_R), (0, 0))
            Line((0, 0), (FILLET_8_R, 0))
        make_face()
    fillet_8_piece_1 = extrude(amount=100, mode=Mode.PRIVATE)
    fillet_8_piece_1 = split(fillet_8_piece_1, bisect_by=Plane(origin=(-17.157282296, -13.337247559, -8.059025643), z_dir=(0, 0.9239164195137738, -0.38259436712117)), keep=Keep.TOP, mode=Mode.PRIVATE)
    fillet_8_piece_1 = split(fillet_8_piece_1, bisect_by=Plane(origin=(-17.157282296, 9.732934462, 0.644929087), z_dir=(0, -0.9239164195137736, -0.3825943671211702)), keep=Keep.TOP, mode=Mode.PRIVATE)
    fillet_8_piece_1 = split(fillet_8_piece_1, bisect_by=Plane(origin=(-11.5, -12.311624775, -8.483736679), z_dir=(-1, 0, 0)), keep=Keep.TOP, mode=Mode.PRIVATE)
    add(fillet_8_piece_1)
    with BuildSketch(Plane(origin=(-18, -50, 0), x_dir=(1, 0, 0), z_dir=(0, 1, 0))) as fillet_8_piece_2_section:
        with BuildLine():
            CenterArc((FILLET_8_R, FILLET_8_R), FILLET_8_R, 180, 90)
            Line((0, FILLET_8_R), (0, 0))
            Line((0, 0), (FILLET_8_R, 0))
        make_face()
    fillet_8_piece_2 = extrude(amount=100, mode=Mode.PRIVATE)
    fillet_8_piece_2 = split(fillet_8_piece_2, bisect_by=Plane(origin=(-11.244845554, -6.5, -2.767260165), z_dir=(0, -1, 0)), keep=Keep.TOP, mode=Mode.PRIVATE)
    fillet_8_piece_2 = split(fillet_8_piece_2, bisect_by=Plane(origin=(-11.244845554, -11.135244088, -2.741469147), z_dir=(0, 0.9239164195137738, -0.38259436712117)), keep=Keep.TOP, mode=Mode.PRIVATE)
    add(fillet_8_piece_2)
    with BuildSketch(Plane(origin=(-18, -50, 0), x_dir=(1, 0, 0), z_dir=(0, 1, 0))) as fillet_8_piece_3_section:
        with BuildLine():
            CenterArc((FILLET_8_R, FILLET_8_R), FILLET_8_R, 180, 90)
            Line((0, FILLET_8_R), (0, 0))
            Line((0, 0), (FILLET_8_R, 0))
        make_face()
    fillet_8_piece_3 = extrude(amount=100, mode=Mode.PRIVATE)
    fillet_8_piece_3 = split(fillet_8_piece_3, bisect_by=Plane(origin=(-9.25068262, 6.5, -0.972078171), z_dir=(0, 1, 0)), keep=Keep.TOP, mode=Mode.PRIVATE)
    fillet_8_piece_3 = split(fillet_8_piece_3, bisect_by=Plane(origin=(-9.25068262, 10.116600815, -0.281576041), z_dir=(0, -0.9239164195137736, -0.3825943671211702)), keep=Keep.TOP, mode=Mode.PRIVATE)
    add(fillet_8_piece_3)


solid = part.part
